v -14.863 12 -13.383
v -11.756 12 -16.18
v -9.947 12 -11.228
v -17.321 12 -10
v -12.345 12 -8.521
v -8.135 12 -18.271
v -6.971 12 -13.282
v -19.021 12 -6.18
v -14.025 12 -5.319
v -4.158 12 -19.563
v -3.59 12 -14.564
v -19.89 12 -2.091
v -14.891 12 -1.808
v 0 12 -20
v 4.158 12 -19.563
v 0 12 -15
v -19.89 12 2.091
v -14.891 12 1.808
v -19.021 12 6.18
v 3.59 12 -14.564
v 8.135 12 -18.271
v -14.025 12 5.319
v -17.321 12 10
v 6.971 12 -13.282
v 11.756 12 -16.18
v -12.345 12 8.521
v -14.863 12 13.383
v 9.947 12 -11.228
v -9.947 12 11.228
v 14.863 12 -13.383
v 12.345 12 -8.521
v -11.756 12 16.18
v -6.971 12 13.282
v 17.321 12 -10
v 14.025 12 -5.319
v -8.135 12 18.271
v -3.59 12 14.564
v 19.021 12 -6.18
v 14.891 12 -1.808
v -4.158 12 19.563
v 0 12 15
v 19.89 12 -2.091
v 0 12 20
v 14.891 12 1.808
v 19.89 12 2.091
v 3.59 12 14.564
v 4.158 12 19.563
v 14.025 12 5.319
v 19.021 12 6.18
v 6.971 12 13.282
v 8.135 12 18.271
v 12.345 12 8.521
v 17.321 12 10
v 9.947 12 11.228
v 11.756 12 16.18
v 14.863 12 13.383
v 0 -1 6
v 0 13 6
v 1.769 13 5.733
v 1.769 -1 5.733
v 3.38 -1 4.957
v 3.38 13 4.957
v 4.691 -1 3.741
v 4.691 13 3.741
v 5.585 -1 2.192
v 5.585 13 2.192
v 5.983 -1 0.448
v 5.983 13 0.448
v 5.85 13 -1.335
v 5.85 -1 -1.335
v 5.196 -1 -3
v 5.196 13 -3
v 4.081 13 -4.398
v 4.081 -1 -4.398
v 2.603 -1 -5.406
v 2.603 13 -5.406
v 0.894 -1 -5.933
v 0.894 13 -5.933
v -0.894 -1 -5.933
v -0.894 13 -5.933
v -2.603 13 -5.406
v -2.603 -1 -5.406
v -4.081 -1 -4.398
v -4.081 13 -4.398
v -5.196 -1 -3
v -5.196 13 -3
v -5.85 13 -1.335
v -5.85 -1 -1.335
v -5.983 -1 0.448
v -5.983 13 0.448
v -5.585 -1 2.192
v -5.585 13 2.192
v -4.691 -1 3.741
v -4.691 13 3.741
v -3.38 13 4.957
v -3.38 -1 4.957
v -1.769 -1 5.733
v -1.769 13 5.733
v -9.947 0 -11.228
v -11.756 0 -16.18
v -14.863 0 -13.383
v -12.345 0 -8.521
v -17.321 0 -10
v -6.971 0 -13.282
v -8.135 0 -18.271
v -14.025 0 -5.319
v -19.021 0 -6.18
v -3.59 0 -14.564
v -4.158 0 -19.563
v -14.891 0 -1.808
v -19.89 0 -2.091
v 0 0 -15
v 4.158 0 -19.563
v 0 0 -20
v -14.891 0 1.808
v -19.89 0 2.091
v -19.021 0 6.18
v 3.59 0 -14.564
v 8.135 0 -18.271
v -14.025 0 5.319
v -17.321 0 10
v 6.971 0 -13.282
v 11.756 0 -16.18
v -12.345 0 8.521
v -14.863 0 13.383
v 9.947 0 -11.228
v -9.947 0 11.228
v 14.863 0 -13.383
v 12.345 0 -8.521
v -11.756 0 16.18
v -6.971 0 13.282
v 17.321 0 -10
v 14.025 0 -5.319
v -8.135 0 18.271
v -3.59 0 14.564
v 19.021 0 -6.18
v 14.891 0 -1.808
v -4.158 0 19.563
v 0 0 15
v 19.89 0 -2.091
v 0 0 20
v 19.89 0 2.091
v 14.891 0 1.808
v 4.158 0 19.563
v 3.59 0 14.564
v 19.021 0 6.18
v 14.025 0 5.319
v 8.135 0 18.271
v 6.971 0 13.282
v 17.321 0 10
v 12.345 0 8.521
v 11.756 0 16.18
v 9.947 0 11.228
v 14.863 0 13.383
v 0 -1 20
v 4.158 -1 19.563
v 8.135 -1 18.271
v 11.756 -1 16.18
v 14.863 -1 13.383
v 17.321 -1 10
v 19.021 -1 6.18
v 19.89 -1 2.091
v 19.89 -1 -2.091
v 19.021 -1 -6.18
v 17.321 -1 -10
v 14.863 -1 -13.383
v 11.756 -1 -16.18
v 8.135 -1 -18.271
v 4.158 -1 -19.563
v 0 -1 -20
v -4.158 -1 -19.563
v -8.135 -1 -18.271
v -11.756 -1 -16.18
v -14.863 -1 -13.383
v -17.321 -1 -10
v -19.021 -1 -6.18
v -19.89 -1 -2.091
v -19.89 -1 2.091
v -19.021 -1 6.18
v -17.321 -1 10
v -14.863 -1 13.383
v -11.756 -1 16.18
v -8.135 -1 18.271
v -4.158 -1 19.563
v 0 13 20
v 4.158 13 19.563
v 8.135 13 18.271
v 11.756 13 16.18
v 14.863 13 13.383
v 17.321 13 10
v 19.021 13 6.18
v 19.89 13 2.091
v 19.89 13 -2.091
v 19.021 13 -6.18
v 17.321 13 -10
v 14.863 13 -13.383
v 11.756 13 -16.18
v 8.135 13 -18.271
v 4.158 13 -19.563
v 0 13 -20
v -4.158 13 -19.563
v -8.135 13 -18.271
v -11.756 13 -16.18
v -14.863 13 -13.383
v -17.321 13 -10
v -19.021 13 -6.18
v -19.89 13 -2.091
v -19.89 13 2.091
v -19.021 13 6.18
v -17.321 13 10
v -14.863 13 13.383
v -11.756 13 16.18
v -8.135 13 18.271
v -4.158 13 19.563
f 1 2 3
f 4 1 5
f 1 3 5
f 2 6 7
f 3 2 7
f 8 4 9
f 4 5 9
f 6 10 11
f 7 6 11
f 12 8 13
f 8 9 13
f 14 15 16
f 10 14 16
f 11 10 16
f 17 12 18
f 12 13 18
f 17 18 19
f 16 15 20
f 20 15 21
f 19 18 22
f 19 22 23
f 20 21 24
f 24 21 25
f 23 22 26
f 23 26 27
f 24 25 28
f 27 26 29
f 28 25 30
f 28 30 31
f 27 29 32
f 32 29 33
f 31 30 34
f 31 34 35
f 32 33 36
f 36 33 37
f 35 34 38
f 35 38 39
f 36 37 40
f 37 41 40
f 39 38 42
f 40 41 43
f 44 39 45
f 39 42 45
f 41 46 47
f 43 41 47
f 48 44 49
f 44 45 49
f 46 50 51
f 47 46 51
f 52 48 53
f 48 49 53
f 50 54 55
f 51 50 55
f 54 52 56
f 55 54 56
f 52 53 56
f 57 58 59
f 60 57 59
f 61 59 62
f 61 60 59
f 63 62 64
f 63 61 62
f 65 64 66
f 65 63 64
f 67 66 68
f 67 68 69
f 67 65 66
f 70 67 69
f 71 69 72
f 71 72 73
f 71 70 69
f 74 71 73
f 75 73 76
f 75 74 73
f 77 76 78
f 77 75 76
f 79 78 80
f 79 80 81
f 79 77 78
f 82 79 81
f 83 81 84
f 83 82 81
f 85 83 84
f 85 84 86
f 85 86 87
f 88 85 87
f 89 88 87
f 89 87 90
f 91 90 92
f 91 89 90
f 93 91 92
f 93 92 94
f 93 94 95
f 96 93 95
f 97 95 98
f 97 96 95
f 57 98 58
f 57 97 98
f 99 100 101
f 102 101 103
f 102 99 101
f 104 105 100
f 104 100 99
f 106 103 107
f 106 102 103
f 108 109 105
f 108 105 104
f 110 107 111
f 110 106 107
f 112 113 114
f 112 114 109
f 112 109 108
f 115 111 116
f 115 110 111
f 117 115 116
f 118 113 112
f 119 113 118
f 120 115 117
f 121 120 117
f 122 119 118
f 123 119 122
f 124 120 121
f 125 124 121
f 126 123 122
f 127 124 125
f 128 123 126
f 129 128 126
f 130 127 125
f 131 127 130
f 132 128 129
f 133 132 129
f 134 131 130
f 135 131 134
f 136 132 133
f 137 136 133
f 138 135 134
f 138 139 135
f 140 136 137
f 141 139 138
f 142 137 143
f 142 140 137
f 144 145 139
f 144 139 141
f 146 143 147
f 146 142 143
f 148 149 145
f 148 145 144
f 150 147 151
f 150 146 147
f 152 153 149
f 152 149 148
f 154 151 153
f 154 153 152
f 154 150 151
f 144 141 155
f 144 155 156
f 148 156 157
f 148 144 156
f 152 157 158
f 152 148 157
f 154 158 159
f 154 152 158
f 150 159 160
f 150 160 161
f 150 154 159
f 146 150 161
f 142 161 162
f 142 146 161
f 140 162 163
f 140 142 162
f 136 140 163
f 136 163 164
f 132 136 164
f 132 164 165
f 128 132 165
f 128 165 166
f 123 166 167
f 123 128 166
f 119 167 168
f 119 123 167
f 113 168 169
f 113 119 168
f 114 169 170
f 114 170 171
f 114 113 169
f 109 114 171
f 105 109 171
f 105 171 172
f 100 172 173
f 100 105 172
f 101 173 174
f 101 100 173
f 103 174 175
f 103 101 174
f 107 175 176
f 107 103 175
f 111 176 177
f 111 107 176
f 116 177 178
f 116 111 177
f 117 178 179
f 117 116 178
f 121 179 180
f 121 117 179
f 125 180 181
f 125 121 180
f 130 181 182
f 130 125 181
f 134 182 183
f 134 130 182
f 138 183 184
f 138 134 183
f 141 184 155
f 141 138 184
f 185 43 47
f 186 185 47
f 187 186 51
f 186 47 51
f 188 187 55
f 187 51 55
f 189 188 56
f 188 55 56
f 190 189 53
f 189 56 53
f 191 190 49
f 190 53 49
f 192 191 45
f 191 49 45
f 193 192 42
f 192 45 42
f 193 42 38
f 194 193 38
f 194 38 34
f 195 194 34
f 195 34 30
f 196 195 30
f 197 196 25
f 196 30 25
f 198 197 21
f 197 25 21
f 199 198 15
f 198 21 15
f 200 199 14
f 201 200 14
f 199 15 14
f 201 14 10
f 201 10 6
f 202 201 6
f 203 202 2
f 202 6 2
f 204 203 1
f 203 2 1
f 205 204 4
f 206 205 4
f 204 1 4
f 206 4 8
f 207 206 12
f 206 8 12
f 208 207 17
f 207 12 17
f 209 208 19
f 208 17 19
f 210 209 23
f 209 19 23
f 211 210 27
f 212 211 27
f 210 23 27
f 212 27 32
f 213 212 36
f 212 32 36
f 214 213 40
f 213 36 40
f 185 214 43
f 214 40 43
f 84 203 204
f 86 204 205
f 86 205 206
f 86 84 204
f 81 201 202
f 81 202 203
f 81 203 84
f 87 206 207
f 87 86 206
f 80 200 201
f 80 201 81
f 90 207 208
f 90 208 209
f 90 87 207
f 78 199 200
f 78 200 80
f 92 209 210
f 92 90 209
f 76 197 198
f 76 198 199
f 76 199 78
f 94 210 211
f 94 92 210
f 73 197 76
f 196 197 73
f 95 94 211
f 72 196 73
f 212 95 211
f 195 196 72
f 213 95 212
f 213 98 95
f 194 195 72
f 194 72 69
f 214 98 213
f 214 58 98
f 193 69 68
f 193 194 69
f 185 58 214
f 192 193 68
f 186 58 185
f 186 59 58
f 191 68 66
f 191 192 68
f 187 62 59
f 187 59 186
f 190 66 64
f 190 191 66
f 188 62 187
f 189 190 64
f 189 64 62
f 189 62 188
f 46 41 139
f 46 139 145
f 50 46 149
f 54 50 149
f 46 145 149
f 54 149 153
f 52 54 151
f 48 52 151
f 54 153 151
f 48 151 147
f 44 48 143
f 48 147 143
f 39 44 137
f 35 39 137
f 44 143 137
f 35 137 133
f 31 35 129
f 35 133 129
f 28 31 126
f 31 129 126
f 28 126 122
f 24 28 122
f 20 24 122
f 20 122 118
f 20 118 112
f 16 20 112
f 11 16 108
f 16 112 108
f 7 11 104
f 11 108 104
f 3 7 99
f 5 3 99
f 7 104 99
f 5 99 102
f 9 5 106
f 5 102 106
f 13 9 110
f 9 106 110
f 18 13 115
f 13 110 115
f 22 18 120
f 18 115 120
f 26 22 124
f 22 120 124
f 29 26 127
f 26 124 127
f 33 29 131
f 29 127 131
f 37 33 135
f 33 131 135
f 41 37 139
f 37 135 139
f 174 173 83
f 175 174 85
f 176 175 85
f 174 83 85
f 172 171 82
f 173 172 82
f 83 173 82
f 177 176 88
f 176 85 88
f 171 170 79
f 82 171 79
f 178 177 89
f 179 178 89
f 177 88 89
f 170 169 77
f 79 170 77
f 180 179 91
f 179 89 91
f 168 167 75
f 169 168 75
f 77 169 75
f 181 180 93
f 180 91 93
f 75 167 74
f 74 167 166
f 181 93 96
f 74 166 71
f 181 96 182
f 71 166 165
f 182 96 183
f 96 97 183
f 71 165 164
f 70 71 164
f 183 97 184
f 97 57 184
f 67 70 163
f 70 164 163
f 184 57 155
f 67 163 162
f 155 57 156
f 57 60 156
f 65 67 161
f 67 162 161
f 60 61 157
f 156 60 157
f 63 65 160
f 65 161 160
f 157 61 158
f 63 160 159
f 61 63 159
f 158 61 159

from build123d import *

# Parameters (mm, degrees)
ESQUISSE1_R        = 20
ESQUISSE1_R_2      = 6
BOSS_EXTRU_1_DEPTH = 1
BOSS_EXTRU_2_START = 12
ESQUISSE1_3_R      = 15
ESQUISSE1_3_R_2    = 6
BOSS_EXTRU_2_DEPTH = 12
BOSS_EXTRU_4_START = 1
ESQUISSE2_R        = 20
ESQUISSE2_R_2      = 6
BOSS_EXTRU_4_DEPTH = 1


with BuildPart() as part:
    # Esquisse1 → Boss.-Extru.1 (new body)
    with BuildSketch(Plane(origin=(0, 0, 0), x_dir=(1, 0, 0), z_dir=(0, 1, 0))):
        Circle(ESQUISSE1_R)
        Circle(ESQUISSE1_R_2, mode=Mode.SUBTRACT)
    extrude(amount=-BOSS_EXTRU_1_DEPTH)

    # Esquisse1<3> → Boss.-Extru.2 (add)
    with BuildSketch(Plane(origin=(0, 0, 0), x_dir=(1, 0, 0), z_dir=(0, 1, 0)).offset(BOSS_EXTRU_2_START)):
        Circle(ESQUISSE1_3_R)
        Circle(ESQUISSE1_3_R_2, mode=Mode.SUBTRACT)
    extrude(amount=-BOSS_EXTRU_2_DEPTH)

    # Esquisse2 → Boss.-Extru.4 (add)
    with BuildSketch(Plane(origin=(0, 12, 0), x_dir=(1, 0, 0), z_dir=(0, 1, 0)).offset(BOSS_EXTRU_4_START)):
        Circle(ESQUISSE2_R)
        Circle(ESQUISSE2_R_2, mode=Mode.SUBTRACT)
    extrude(amount=-BOSS_EXTRU_4_DEPTH)


solid = part.part
